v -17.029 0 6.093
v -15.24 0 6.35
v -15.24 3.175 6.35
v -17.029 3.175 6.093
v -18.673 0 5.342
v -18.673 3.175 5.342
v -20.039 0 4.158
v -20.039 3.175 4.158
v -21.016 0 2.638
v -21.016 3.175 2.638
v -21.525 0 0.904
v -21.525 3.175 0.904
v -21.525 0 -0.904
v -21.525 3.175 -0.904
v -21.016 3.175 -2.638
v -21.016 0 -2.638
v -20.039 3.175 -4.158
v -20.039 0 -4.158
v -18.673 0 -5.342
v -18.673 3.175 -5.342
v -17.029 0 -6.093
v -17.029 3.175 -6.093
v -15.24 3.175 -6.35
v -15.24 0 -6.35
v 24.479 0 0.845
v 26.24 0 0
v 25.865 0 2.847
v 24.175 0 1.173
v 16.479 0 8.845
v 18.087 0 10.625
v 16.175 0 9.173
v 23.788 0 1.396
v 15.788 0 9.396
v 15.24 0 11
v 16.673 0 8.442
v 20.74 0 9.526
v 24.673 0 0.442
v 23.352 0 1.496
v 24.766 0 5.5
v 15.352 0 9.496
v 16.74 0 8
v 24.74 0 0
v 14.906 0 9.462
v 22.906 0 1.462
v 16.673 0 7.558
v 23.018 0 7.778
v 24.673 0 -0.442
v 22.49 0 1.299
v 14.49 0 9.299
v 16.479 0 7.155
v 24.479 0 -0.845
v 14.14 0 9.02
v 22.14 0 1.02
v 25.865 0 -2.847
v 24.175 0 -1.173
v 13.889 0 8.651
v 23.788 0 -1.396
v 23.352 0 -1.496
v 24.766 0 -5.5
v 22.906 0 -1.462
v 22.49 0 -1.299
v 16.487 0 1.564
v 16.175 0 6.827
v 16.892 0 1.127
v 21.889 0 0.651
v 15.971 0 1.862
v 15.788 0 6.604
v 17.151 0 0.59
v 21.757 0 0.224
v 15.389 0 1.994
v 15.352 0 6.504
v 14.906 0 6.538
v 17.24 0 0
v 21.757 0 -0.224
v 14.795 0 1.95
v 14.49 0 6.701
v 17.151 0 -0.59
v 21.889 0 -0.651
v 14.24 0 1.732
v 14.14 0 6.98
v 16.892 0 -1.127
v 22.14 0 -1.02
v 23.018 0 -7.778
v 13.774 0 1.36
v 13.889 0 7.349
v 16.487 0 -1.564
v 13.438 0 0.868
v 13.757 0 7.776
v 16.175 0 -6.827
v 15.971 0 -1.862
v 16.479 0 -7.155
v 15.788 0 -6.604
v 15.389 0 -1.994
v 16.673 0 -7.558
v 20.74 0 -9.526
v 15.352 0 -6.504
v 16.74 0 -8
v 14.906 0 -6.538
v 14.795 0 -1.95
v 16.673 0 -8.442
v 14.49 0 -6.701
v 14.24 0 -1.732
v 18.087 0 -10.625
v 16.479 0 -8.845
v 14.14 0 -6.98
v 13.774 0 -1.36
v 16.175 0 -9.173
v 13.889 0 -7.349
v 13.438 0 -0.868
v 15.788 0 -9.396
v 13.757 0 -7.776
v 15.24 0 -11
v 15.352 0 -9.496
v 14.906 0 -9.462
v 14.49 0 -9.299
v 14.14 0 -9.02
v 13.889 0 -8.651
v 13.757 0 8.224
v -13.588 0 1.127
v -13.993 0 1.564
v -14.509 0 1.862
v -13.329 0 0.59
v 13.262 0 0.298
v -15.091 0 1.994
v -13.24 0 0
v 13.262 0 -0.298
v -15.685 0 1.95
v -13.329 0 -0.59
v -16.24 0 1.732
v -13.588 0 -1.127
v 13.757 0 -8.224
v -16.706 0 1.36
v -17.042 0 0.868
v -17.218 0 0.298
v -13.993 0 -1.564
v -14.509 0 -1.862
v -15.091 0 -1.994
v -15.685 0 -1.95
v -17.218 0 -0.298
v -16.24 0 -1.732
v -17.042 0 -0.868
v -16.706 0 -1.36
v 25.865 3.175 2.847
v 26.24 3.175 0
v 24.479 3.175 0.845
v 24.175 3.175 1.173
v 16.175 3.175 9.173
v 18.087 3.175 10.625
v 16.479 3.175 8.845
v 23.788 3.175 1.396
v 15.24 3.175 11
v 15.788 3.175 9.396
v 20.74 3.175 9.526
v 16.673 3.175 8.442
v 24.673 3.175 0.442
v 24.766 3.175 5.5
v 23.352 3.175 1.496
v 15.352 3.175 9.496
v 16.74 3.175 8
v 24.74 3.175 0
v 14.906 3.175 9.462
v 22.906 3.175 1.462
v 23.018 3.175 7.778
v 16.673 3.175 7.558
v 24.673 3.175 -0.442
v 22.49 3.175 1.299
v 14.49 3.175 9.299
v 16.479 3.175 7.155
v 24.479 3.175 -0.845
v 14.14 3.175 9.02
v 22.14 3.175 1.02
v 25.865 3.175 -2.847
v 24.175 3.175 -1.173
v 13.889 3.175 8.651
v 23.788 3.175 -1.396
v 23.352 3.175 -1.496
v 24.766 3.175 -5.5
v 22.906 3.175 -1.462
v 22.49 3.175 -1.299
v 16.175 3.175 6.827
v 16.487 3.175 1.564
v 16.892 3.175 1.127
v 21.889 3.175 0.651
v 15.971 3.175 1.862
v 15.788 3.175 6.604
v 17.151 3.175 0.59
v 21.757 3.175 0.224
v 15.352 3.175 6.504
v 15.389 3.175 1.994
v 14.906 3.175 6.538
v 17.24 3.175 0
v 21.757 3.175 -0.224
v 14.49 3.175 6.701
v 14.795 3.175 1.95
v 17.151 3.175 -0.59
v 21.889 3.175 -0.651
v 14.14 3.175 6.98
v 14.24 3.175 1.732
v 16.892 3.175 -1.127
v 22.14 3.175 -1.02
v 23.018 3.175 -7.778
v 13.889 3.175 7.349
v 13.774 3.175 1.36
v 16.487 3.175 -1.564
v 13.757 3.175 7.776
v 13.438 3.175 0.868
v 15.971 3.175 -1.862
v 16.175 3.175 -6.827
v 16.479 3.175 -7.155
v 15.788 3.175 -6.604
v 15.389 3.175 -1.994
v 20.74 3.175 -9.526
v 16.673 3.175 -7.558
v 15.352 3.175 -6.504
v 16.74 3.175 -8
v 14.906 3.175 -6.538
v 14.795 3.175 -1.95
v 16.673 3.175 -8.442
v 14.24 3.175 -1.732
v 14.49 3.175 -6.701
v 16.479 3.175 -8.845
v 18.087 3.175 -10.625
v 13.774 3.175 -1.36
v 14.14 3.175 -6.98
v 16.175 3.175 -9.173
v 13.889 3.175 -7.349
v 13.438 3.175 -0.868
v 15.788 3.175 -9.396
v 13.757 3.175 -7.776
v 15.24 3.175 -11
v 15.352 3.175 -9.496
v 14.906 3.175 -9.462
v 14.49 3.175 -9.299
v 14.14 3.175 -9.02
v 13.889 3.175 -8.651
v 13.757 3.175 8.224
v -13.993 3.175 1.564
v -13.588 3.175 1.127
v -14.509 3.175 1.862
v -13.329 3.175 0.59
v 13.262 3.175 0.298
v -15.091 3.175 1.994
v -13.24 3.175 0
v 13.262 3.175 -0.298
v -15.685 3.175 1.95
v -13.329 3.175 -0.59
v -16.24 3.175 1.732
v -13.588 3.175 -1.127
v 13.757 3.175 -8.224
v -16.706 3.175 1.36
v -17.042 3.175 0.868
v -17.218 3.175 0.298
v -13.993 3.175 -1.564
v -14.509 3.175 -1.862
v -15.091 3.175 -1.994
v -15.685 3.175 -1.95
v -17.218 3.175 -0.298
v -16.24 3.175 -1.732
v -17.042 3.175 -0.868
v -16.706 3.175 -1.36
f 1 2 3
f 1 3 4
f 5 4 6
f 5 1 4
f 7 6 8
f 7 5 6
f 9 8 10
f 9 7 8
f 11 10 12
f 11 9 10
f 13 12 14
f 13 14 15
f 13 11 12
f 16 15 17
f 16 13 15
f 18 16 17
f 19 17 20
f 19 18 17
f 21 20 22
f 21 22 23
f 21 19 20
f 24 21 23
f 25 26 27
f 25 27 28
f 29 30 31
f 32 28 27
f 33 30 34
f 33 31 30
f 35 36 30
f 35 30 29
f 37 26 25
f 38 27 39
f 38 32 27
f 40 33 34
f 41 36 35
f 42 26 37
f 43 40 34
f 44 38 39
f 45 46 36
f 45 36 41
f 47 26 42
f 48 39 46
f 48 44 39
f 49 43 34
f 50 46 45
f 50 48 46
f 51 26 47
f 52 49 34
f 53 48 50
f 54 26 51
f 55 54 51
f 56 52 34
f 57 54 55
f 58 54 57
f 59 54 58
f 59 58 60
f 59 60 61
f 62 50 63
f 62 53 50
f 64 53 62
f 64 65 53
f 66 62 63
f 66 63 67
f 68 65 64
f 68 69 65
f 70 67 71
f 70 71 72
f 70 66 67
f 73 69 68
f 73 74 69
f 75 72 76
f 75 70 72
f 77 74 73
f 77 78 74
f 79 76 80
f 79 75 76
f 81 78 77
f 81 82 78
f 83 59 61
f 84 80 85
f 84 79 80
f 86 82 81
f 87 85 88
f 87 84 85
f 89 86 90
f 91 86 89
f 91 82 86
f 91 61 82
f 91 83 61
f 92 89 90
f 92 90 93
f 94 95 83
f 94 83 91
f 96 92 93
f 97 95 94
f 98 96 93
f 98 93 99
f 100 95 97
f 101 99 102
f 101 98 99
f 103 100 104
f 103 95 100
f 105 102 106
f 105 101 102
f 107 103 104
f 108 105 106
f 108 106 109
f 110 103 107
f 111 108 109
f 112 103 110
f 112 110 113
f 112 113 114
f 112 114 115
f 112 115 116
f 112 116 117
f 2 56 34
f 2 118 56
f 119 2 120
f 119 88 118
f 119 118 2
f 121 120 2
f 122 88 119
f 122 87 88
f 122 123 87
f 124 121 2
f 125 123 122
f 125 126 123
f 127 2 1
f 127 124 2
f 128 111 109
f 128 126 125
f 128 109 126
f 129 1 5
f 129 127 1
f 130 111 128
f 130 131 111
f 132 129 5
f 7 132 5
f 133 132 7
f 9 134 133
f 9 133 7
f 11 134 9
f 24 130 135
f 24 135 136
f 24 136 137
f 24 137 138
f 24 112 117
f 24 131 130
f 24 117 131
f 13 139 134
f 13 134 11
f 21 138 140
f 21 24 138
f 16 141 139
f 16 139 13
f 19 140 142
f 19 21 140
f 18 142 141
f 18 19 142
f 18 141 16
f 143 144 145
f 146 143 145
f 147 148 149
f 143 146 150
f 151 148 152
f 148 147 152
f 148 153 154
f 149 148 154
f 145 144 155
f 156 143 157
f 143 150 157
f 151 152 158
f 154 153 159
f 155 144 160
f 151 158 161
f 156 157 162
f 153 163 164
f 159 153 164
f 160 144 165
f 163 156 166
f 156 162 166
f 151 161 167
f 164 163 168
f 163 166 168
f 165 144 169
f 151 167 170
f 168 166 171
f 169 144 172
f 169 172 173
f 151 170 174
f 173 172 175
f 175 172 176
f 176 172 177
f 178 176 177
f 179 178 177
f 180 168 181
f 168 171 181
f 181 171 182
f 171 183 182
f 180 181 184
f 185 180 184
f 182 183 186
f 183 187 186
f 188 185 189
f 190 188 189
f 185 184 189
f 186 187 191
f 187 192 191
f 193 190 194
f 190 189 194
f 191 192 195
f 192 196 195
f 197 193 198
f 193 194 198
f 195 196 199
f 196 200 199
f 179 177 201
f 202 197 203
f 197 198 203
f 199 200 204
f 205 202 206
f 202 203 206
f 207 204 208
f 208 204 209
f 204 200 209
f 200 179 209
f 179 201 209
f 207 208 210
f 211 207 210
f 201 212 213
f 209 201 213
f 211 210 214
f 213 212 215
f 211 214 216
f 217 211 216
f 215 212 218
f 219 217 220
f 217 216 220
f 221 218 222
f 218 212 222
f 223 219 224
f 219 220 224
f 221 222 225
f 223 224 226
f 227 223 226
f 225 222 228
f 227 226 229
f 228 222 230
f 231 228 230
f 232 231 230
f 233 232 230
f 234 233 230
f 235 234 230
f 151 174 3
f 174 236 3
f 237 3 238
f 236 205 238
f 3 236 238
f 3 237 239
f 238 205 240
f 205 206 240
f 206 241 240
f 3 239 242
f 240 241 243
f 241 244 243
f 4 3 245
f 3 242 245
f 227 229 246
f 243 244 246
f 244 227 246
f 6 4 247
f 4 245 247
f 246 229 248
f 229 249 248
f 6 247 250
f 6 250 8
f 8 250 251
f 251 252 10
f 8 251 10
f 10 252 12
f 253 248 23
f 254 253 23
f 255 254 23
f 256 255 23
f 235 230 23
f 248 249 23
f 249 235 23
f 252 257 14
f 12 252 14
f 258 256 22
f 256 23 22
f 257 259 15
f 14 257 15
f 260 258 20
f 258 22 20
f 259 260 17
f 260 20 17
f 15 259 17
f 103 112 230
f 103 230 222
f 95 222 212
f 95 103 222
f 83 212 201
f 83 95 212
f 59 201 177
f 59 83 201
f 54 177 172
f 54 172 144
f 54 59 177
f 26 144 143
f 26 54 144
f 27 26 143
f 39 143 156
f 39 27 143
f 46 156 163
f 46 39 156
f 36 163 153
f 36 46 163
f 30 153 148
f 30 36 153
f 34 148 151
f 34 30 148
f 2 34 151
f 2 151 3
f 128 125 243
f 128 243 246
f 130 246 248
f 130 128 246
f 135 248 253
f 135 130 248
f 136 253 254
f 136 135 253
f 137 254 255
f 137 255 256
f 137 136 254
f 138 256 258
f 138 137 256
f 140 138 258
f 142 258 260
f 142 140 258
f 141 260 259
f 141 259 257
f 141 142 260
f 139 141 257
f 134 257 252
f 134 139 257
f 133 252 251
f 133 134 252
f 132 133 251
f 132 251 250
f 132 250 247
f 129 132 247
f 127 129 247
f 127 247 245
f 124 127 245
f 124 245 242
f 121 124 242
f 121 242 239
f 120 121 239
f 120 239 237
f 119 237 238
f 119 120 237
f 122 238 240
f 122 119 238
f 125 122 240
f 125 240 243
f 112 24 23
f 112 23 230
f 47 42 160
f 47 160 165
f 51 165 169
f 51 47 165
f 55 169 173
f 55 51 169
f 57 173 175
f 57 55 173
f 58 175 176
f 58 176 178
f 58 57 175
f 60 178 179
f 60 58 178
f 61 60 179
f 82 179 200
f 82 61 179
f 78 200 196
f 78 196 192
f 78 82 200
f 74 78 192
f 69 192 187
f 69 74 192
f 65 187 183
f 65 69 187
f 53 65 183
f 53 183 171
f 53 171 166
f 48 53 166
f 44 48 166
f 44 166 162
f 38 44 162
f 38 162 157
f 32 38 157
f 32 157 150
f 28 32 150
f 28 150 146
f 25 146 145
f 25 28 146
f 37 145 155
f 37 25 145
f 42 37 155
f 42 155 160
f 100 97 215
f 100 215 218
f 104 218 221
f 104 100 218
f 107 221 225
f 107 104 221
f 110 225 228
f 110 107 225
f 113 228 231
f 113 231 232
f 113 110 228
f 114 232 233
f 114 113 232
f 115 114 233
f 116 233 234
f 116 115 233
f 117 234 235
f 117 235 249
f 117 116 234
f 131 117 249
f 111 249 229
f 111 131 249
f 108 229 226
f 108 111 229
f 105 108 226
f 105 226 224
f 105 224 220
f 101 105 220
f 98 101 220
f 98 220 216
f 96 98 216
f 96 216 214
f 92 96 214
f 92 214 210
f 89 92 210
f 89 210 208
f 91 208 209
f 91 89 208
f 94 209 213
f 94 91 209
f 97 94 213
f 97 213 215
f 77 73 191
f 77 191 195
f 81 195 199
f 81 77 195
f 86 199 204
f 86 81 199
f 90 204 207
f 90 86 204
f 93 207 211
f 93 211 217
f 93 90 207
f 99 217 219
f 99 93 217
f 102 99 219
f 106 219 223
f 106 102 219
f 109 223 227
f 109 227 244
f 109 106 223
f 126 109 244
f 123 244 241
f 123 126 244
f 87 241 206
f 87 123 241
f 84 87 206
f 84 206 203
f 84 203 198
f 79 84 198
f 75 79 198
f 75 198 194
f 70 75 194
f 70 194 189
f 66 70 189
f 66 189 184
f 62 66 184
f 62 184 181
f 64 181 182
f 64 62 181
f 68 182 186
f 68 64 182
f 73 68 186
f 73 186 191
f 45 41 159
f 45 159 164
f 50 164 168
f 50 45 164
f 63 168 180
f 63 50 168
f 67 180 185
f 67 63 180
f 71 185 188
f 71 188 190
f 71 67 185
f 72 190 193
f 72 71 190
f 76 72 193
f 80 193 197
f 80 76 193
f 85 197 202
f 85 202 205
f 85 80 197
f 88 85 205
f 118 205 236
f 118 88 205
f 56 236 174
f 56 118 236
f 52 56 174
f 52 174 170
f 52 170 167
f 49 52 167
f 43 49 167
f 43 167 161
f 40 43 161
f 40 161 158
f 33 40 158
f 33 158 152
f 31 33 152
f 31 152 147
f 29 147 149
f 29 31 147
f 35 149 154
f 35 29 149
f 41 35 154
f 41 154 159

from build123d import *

# Parameters (mm, degrees)
SKETCH1_R           = 2.000000064
SKETCH1_R_2         = 1.5
BOSS_EXTRUDE1_DEPTH = 3.175


with BuildPart() as part:
    # Sketch1 → Boss-Extrude1 (new body)
    with BuildSketch(Plane(origin=(0, 0, 0), x_dir=(1, 0, 0), z_dir=(0, 1, 0))):
        with BuildLine():
            Line((15.24, -11), (-15.24, -6.35))
            ThreePointArc((-15.24, -6.35), (-21.59, 0), (-15.24, 6.35))
            Line((-15.24, 6.35), (15.24, 11))
            ThreePointArc((15.24, 11), (26.24, 0), (15.24, -11))
        make_face()
        with Locations((-15.24, 0)):
            Circle(SKETCH1_R, mode=Mode.SUBTRACT)
        with Locations((15.24, 0)):
            Circle(SKETCH1_R, mode=Mode.SUBTRACT)
        with Locations((15.24, 8)):
            Circle(SKETCH1_R_2, mode=Mode.SUBTRACT)
        with Locations((23.24, 0)):
            Circle(SKETCH1_R_2, mode=Mode.SUBTRACT)
        with Locations((15.24, -8)):
            Circle(SKETCH1_R_2, mode=Mode.SUBTRACT)
    extrude(amount=BOSS_EXTRUDE1_DEPTH)


solid = part.part
